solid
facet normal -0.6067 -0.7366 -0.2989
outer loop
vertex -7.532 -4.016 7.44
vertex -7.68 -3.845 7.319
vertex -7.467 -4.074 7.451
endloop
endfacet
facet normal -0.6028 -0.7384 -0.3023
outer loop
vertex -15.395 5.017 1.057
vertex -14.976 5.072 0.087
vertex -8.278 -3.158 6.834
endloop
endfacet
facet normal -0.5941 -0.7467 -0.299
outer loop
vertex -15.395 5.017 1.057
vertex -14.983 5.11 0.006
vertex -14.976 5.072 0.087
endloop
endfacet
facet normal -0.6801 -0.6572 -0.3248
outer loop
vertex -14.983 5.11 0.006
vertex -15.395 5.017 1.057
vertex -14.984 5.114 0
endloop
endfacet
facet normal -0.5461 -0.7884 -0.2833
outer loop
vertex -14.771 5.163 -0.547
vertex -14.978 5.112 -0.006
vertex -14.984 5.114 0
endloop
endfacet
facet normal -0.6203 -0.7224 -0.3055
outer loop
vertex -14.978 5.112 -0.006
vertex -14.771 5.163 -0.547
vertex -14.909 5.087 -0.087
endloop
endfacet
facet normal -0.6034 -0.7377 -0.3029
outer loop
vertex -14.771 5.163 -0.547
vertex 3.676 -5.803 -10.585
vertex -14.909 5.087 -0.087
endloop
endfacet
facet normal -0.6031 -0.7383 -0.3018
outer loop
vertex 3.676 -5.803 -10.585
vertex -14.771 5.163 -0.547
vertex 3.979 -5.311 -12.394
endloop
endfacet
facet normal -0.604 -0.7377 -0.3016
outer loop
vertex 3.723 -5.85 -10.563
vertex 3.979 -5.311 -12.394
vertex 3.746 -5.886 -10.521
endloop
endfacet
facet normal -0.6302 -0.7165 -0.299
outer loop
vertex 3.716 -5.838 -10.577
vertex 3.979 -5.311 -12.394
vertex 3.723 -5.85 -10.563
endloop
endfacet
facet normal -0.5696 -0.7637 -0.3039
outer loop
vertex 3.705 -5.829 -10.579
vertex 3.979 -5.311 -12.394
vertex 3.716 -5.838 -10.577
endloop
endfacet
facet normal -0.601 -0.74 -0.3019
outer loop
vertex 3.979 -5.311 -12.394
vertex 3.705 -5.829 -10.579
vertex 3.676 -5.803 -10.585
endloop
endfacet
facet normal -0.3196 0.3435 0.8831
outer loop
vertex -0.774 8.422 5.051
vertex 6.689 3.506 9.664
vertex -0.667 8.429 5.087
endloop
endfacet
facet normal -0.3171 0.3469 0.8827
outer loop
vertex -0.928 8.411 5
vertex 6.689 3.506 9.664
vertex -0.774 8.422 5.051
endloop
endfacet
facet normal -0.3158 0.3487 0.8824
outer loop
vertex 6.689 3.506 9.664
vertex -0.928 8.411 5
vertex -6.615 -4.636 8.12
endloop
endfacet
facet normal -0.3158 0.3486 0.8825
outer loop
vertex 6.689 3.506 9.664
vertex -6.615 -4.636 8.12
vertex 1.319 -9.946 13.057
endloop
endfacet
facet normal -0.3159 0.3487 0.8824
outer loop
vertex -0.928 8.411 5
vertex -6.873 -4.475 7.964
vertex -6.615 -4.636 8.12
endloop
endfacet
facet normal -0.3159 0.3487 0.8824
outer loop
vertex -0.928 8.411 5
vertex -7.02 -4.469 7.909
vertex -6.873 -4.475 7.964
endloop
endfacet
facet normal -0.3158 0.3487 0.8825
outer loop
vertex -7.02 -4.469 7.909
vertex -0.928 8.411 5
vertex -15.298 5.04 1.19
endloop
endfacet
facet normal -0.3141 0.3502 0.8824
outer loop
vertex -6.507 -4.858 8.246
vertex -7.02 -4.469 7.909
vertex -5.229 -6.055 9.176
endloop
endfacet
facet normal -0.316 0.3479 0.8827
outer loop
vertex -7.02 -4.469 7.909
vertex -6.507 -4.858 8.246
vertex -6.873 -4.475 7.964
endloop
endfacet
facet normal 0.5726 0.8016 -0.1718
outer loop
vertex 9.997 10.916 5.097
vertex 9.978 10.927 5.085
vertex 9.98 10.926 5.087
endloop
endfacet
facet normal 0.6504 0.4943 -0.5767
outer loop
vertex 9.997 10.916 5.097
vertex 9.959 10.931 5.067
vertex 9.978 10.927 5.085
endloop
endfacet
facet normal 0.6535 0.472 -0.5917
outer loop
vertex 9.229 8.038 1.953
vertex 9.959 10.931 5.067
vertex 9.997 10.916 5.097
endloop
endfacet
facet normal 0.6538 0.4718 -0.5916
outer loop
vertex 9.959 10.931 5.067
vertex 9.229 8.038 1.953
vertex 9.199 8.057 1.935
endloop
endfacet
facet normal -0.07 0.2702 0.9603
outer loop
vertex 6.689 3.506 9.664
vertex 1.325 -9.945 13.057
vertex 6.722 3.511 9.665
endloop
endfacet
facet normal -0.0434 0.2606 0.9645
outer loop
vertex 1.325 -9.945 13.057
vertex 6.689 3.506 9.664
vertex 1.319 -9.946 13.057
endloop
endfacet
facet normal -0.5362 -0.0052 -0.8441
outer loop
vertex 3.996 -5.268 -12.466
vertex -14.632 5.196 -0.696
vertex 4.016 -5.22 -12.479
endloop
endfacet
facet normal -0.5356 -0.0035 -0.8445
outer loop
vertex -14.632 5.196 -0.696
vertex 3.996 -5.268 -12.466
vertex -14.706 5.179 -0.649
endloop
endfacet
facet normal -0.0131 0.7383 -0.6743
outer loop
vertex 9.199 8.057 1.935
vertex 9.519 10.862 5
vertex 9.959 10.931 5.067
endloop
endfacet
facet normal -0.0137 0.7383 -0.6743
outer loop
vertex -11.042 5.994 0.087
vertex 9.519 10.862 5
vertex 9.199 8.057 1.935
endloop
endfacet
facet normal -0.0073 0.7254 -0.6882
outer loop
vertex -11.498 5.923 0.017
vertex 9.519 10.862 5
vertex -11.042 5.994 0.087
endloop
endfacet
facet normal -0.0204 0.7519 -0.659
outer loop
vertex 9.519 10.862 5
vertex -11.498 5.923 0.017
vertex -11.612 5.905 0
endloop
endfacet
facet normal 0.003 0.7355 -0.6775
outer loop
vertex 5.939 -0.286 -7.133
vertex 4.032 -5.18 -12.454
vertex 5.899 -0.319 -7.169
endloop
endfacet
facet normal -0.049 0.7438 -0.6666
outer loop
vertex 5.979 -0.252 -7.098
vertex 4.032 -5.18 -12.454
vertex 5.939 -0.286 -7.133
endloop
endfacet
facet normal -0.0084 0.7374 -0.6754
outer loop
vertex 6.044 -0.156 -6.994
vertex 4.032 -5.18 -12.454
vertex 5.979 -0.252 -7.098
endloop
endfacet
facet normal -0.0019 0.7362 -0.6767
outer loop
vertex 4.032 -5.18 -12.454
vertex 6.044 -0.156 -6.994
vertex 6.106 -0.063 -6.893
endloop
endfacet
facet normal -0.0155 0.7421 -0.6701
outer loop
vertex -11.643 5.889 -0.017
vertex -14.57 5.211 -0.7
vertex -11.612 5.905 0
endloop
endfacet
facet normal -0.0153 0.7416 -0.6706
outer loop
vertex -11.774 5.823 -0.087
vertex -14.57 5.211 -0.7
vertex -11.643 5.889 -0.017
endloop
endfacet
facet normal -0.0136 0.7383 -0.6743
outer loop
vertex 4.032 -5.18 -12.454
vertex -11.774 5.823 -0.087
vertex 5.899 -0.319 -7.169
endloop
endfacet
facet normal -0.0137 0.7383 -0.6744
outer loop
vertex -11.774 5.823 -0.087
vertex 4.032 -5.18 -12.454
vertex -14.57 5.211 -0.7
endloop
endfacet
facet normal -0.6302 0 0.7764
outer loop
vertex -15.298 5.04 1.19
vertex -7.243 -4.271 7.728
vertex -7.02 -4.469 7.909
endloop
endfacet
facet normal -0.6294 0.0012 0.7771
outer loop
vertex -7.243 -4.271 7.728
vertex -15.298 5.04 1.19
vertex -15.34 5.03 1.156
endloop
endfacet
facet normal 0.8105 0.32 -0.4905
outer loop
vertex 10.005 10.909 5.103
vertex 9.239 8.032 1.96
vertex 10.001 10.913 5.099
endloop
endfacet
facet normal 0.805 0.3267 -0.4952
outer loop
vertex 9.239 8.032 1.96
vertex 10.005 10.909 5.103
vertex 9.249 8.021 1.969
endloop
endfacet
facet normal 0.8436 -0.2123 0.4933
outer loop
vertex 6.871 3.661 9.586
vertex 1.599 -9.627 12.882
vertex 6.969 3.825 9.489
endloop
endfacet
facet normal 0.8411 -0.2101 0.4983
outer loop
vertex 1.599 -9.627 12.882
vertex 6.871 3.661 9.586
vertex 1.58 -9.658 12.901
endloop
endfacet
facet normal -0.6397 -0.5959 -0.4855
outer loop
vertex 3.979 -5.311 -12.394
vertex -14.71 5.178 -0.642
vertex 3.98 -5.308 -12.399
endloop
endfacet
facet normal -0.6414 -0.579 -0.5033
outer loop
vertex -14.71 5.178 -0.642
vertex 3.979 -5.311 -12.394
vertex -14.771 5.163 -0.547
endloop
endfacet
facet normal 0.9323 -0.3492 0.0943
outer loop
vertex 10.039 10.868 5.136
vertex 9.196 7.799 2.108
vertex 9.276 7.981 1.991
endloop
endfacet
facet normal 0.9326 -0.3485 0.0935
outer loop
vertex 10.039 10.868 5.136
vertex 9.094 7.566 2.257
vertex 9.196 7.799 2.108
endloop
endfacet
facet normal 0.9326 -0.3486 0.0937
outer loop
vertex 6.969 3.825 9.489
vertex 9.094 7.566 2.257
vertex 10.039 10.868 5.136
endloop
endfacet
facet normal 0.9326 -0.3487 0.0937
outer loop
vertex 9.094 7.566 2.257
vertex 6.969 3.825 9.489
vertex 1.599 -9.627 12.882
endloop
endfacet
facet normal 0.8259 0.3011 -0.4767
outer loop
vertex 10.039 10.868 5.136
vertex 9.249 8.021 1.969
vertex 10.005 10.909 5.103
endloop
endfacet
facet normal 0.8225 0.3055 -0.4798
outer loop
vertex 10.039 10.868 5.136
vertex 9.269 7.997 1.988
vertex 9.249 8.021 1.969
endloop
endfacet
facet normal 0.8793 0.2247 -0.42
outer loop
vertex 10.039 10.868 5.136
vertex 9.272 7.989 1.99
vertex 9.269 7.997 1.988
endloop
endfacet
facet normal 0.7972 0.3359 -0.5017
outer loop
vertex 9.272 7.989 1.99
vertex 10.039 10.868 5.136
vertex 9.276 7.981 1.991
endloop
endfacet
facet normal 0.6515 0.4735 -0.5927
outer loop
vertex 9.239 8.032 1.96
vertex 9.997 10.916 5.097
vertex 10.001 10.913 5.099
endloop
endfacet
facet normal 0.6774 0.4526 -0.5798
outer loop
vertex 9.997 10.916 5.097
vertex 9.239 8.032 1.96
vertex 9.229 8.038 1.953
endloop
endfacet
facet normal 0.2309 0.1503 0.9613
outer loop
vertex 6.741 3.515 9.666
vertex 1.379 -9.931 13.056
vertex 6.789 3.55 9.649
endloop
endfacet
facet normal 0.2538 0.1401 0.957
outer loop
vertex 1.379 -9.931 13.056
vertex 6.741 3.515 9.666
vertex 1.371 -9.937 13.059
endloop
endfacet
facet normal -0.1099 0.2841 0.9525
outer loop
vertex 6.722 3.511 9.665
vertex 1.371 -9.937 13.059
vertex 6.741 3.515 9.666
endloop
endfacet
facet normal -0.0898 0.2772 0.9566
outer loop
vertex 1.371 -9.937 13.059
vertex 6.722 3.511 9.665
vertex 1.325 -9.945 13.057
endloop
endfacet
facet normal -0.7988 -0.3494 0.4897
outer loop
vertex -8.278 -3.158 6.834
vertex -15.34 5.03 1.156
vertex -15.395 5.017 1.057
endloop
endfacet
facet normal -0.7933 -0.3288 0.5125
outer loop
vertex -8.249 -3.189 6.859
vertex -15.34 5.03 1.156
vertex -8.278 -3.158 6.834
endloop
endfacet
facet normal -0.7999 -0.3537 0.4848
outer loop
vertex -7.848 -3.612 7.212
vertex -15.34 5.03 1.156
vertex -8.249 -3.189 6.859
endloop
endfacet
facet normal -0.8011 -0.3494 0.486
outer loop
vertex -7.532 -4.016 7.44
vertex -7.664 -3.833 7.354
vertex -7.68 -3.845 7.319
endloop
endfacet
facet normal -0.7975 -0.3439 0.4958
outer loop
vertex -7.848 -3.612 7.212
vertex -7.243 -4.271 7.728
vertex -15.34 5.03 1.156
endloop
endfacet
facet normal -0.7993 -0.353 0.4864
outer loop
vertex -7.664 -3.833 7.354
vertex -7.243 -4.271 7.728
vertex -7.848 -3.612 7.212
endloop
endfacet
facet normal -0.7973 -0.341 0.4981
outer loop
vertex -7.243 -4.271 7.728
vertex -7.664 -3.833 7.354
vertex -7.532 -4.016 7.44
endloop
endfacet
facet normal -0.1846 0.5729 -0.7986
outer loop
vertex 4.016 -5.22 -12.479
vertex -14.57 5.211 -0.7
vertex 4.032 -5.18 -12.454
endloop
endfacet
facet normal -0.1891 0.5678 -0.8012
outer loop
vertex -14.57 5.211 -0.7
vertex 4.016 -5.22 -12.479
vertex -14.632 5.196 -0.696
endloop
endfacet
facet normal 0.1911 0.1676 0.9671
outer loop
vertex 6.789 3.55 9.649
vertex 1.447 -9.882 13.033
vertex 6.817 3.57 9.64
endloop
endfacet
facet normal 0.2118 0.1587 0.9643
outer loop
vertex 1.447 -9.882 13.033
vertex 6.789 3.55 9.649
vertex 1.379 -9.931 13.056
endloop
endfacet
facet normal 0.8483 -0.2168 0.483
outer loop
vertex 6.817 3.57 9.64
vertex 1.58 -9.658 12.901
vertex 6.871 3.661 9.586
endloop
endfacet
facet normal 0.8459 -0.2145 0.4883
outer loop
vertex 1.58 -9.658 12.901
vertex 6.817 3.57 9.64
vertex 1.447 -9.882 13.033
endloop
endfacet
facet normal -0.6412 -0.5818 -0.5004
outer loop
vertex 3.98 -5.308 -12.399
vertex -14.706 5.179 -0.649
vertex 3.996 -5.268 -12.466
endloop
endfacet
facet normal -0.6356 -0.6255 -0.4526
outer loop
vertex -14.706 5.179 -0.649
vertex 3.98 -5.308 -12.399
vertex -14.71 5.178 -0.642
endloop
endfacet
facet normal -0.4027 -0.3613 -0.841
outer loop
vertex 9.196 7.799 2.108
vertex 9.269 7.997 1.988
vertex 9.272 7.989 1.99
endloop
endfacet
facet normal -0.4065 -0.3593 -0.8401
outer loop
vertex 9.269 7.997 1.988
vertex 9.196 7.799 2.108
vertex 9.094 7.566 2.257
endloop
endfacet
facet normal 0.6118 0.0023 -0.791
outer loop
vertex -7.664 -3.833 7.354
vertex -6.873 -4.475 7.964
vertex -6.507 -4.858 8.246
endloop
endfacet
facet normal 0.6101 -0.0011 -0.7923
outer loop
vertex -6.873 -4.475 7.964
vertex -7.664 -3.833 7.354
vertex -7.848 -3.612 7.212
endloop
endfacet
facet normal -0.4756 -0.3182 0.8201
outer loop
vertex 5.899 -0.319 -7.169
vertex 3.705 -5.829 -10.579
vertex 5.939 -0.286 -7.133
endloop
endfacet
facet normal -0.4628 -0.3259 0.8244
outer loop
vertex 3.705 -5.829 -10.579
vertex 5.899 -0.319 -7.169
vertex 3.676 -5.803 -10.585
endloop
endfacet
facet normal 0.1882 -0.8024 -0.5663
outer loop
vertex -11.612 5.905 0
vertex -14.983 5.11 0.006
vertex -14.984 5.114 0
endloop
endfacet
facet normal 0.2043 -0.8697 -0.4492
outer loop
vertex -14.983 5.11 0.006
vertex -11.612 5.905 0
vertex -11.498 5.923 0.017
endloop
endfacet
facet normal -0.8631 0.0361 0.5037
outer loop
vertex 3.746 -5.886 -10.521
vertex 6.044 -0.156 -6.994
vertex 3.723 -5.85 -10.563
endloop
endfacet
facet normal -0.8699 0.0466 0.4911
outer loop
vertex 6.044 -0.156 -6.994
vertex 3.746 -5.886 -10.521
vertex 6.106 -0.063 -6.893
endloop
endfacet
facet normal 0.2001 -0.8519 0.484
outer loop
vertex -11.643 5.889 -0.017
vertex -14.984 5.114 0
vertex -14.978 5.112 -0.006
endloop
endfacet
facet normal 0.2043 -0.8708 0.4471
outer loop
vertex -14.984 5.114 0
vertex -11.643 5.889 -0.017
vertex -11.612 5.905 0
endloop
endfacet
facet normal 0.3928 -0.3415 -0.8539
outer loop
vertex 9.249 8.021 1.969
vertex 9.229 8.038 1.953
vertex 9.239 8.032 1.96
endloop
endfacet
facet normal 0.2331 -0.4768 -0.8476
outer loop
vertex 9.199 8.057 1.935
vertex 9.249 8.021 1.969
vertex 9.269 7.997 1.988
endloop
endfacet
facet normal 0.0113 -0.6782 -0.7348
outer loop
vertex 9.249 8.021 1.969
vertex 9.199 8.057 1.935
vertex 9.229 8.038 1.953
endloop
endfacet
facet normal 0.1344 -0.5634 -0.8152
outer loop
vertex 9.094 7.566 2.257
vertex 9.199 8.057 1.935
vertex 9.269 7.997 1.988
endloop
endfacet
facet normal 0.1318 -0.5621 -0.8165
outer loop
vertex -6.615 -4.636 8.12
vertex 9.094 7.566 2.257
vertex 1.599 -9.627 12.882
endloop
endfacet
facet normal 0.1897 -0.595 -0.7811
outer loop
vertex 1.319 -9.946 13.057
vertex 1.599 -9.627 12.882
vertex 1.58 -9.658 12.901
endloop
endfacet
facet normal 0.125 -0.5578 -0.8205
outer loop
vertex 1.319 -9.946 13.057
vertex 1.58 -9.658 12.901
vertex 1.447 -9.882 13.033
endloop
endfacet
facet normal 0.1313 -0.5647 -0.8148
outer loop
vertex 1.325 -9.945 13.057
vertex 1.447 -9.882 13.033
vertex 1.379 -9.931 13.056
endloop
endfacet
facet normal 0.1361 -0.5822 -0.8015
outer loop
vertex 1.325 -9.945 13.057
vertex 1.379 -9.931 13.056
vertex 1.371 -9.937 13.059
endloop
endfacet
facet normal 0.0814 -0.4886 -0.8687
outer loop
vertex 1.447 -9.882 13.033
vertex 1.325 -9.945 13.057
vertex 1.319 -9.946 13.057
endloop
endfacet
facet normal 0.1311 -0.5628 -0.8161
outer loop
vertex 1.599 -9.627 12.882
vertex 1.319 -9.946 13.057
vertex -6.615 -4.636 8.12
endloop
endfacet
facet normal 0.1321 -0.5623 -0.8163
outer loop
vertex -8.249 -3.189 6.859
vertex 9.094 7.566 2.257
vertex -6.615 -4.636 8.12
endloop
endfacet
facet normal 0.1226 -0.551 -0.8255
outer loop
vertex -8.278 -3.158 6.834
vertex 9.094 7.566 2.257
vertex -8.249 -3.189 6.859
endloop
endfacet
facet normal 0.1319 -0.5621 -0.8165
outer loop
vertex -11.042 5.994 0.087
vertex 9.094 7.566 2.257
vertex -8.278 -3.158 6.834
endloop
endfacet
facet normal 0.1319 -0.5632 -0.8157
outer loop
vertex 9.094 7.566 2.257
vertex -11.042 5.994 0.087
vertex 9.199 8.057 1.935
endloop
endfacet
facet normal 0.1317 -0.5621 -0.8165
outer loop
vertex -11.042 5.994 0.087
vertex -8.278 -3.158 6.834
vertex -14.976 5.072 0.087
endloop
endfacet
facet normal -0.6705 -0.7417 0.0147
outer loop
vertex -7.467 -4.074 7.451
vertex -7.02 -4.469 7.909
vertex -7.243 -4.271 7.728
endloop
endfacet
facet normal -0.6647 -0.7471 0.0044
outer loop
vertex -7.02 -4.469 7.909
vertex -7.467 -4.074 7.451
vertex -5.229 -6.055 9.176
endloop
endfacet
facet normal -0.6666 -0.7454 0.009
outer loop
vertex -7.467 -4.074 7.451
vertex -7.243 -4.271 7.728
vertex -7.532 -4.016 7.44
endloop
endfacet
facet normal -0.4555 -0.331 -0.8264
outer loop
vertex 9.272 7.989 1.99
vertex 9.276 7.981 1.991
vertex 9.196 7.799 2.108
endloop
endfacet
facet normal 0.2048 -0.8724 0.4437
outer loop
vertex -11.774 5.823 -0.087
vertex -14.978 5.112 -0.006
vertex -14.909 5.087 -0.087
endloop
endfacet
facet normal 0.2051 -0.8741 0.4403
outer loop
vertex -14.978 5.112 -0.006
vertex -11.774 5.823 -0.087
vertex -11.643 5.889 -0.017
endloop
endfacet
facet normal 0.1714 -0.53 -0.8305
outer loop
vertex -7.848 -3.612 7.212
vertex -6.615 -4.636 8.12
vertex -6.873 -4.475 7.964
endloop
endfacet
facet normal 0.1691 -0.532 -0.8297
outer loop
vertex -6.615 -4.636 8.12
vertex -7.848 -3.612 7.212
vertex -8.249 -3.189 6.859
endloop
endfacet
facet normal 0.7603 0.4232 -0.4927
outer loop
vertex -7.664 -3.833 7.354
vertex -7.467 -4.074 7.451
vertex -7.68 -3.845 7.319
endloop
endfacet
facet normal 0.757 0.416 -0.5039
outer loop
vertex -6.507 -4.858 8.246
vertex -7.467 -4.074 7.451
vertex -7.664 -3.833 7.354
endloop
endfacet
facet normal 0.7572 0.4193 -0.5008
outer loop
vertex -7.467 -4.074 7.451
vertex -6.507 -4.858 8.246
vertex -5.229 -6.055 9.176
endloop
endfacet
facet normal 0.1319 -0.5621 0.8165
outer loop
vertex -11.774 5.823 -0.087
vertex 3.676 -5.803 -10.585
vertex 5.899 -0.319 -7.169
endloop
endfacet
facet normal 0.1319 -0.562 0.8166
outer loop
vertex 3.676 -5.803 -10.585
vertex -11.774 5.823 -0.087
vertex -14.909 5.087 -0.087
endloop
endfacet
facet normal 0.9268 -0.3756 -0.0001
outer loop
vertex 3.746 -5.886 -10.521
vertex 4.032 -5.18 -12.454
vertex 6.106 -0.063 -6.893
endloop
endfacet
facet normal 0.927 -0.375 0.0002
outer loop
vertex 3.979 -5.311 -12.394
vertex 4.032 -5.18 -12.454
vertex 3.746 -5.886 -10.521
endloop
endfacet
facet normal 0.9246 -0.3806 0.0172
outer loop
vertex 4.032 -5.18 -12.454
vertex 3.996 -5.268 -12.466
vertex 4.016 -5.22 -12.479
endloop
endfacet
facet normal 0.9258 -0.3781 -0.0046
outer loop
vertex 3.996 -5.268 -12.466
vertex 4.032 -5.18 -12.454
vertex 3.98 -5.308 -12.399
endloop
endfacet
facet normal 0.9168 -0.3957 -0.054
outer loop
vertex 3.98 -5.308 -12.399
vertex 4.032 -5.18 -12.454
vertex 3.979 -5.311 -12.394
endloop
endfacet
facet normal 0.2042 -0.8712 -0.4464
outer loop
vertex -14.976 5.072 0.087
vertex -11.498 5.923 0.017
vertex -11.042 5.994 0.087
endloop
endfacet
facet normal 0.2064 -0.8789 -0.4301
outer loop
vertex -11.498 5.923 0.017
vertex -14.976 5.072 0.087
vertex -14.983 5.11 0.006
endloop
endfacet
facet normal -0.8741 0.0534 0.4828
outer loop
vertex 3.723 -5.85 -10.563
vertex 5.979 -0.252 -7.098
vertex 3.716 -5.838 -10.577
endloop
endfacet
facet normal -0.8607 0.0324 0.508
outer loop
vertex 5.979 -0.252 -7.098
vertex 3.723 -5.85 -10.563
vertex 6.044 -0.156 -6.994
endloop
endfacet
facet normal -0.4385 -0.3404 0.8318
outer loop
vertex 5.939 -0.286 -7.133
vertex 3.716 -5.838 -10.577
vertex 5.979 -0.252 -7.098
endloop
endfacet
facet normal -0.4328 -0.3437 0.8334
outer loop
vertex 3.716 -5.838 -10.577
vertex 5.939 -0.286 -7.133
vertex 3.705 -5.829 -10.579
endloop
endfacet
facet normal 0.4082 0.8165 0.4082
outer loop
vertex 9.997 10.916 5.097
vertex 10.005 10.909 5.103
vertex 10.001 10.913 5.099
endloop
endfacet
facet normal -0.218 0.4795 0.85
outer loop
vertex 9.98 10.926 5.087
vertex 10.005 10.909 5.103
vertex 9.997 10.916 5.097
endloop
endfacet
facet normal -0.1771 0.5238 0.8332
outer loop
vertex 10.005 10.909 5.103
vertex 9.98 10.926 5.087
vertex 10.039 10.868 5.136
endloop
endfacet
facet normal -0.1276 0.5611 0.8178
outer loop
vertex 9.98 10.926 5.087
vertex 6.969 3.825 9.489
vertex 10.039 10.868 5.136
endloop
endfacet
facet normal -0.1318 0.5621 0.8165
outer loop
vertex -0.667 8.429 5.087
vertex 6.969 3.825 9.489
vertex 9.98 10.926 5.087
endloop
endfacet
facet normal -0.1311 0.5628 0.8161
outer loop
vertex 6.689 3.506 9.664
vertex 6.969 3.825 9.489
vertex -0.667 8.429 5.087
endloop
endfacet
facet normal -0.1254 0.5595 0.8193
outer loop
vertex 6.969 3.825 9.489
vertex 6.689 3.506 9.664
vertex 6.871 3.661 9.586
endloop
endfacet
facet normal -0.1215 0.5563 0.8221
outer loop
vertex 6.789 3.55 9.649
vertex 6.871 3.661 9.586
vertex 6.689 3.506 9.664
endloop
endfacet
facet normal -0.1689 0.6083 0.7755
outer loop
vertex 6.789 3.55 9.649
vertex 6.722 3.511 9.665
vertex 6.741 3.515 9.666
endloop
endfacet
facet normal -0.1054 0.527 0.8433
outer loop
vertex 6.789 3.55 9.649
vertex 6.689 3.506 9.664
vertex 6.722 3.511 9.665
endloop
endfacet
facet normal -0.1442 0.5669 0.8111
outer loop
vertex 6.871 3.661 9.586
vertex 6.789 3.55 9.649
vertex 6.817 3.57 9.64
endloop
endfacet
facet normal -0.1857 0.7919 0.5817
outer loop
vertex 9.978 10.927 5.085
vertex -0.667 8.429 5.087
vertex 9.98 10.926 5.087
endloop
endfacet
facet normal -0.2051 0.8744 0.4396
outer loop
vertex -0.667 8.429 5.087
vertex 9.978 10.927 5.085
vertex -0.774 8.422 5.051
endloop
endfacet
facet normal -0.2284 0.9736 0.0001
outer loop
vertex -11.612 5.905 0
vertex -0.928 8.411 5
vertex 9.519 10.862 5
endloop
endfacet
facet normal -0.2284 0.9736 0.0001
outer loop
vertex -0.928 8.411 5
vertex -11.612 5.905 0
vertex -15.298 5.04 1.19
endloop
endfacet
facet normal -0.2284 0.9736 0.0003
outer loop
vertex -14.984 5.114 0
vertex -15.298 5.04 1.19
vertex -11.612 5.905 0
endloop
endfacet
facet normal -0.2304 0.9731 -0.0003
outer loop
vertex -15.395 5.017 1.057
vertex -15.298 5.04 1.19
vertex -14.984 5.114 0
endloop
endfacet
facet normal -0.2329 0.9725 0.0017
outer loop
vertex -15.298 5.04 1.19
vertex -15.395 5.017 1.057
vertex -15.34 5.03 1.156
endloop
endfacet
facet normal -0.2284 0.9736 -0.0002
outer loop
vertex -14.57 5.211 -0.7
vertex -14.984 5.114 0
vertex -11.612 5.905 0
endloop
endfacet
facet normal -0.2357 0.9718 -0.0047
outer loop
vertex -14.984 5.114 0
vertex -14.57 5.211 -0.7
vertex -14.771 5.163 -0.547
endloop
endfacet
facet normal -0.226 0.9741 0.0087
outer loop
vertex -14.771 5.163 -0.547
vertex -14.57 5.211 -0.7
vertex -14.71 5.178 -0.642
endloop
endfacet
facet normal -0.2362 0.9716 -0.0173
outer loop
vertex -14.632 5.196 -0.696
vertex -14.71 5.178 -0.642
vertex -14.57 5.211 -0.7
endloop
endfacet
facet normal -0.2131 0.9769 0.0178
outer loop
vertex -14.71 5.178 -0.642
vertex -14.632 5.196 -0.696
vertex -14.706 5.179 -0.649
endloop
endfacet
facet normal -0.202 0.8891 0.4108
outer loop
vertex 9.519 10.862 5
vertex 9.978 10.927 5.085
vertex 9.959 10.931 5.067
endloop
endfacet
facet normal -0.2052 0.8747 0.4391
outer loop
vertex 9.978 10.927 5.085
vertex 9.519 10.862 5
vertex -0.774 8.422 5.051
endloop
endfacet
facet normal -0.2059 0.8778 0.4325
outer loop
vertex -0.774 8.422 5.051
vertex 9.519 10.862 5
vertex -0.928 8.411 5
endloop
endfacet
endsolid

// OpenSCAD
// Auto-generated OpenSCAD file

    shift = 2;

    inner_points = 10*[[0.12901184565419158, -1.1699259752211888, 1.4142135623758847], [1.0490265825492964, 1.1002222322471154, -5.792921697889142e-12], [0.12901184565014698, -1.1699259752302433, -1.414213562370305], [-1.704632831118821, 0.45418830626724893, 2.1305179842556754e-13]];

    outer_points_unshifted = 10*[[-1.6152381377604375, 0.6038761652565141, -0.16229397819784264], [1.044668423926776, 1.2788016175447572, 0.52281383590649], [0.02365654881311341, -1.2788016175447572, 1.1679498236924246], [0.5469131650205479, -0.6038761652565141, -1.5284696814010719]];
    
    outer_points = [for (p = outer_points_unshifted) [p[0], p[1], p[2] + shift]];

    // Convex hull for inner set (I)
    module inner_hull() {
        hull() {
            for (p = inner_points) {
                translate(p) sphere(r=0.1);
            }
        }
    }

    // Convex hull for outer set (O) minus inner hull (O \ I)
    module outer_minus_inner() {
        difference() {
            hull() {
                for (p = outer_points) {
                    translate(p) sphere(r=0.1);
                }
            }
            inner_hull(); // Subtract inner hull
        }
    }

    // Convex hull for outer set (O) minus all translated inner hulls
    module outer_minus_AllTranslationInner() {
        difference() {
            hull() {
                for (p = outer_points) {
                    translate(p) sphere(r=0.1);
                }
            }
            hull() {
                translate([0,0,5]) inner_hull();
                translate([0,0,-5]) inner_hull();
            }; // Subtract translated inner hulls
        }
    }

    // Difference between outer_minus_inner and outer_minus_AllTranslationInner
    module outer_minus_inner_diff() {
        difference() {
            // Outer minus inner
            difference() {
                hull() {
                    for (p = outer_points) {
                        translate(p) sphere(r=0.1);
                    }
                }
                inner_hull();
            }

            // Subtract Outer minus AllTranslationInner
            difference() {
                hull() {
                    for (p = outer_points) {
                        translate(p) sphere(r=0.1);
                    }
                }
                hull() {
                    translate([0,0,5]) inner_hull();
                    translate([0,0,-5]) inner_hull();
                };
            }
        }
    }

    // Rendering all with colors applied
    // color([1, 0, 0, 0.5]) inner_hull(); // Transparent red
    // color([0, 1, 0, 1]) outer_minus_AllTranslationInner(); // Opaque green
    color([1, 1, 0, 1]) outer_minus_inner_diff(); // Opaque yellow
    
